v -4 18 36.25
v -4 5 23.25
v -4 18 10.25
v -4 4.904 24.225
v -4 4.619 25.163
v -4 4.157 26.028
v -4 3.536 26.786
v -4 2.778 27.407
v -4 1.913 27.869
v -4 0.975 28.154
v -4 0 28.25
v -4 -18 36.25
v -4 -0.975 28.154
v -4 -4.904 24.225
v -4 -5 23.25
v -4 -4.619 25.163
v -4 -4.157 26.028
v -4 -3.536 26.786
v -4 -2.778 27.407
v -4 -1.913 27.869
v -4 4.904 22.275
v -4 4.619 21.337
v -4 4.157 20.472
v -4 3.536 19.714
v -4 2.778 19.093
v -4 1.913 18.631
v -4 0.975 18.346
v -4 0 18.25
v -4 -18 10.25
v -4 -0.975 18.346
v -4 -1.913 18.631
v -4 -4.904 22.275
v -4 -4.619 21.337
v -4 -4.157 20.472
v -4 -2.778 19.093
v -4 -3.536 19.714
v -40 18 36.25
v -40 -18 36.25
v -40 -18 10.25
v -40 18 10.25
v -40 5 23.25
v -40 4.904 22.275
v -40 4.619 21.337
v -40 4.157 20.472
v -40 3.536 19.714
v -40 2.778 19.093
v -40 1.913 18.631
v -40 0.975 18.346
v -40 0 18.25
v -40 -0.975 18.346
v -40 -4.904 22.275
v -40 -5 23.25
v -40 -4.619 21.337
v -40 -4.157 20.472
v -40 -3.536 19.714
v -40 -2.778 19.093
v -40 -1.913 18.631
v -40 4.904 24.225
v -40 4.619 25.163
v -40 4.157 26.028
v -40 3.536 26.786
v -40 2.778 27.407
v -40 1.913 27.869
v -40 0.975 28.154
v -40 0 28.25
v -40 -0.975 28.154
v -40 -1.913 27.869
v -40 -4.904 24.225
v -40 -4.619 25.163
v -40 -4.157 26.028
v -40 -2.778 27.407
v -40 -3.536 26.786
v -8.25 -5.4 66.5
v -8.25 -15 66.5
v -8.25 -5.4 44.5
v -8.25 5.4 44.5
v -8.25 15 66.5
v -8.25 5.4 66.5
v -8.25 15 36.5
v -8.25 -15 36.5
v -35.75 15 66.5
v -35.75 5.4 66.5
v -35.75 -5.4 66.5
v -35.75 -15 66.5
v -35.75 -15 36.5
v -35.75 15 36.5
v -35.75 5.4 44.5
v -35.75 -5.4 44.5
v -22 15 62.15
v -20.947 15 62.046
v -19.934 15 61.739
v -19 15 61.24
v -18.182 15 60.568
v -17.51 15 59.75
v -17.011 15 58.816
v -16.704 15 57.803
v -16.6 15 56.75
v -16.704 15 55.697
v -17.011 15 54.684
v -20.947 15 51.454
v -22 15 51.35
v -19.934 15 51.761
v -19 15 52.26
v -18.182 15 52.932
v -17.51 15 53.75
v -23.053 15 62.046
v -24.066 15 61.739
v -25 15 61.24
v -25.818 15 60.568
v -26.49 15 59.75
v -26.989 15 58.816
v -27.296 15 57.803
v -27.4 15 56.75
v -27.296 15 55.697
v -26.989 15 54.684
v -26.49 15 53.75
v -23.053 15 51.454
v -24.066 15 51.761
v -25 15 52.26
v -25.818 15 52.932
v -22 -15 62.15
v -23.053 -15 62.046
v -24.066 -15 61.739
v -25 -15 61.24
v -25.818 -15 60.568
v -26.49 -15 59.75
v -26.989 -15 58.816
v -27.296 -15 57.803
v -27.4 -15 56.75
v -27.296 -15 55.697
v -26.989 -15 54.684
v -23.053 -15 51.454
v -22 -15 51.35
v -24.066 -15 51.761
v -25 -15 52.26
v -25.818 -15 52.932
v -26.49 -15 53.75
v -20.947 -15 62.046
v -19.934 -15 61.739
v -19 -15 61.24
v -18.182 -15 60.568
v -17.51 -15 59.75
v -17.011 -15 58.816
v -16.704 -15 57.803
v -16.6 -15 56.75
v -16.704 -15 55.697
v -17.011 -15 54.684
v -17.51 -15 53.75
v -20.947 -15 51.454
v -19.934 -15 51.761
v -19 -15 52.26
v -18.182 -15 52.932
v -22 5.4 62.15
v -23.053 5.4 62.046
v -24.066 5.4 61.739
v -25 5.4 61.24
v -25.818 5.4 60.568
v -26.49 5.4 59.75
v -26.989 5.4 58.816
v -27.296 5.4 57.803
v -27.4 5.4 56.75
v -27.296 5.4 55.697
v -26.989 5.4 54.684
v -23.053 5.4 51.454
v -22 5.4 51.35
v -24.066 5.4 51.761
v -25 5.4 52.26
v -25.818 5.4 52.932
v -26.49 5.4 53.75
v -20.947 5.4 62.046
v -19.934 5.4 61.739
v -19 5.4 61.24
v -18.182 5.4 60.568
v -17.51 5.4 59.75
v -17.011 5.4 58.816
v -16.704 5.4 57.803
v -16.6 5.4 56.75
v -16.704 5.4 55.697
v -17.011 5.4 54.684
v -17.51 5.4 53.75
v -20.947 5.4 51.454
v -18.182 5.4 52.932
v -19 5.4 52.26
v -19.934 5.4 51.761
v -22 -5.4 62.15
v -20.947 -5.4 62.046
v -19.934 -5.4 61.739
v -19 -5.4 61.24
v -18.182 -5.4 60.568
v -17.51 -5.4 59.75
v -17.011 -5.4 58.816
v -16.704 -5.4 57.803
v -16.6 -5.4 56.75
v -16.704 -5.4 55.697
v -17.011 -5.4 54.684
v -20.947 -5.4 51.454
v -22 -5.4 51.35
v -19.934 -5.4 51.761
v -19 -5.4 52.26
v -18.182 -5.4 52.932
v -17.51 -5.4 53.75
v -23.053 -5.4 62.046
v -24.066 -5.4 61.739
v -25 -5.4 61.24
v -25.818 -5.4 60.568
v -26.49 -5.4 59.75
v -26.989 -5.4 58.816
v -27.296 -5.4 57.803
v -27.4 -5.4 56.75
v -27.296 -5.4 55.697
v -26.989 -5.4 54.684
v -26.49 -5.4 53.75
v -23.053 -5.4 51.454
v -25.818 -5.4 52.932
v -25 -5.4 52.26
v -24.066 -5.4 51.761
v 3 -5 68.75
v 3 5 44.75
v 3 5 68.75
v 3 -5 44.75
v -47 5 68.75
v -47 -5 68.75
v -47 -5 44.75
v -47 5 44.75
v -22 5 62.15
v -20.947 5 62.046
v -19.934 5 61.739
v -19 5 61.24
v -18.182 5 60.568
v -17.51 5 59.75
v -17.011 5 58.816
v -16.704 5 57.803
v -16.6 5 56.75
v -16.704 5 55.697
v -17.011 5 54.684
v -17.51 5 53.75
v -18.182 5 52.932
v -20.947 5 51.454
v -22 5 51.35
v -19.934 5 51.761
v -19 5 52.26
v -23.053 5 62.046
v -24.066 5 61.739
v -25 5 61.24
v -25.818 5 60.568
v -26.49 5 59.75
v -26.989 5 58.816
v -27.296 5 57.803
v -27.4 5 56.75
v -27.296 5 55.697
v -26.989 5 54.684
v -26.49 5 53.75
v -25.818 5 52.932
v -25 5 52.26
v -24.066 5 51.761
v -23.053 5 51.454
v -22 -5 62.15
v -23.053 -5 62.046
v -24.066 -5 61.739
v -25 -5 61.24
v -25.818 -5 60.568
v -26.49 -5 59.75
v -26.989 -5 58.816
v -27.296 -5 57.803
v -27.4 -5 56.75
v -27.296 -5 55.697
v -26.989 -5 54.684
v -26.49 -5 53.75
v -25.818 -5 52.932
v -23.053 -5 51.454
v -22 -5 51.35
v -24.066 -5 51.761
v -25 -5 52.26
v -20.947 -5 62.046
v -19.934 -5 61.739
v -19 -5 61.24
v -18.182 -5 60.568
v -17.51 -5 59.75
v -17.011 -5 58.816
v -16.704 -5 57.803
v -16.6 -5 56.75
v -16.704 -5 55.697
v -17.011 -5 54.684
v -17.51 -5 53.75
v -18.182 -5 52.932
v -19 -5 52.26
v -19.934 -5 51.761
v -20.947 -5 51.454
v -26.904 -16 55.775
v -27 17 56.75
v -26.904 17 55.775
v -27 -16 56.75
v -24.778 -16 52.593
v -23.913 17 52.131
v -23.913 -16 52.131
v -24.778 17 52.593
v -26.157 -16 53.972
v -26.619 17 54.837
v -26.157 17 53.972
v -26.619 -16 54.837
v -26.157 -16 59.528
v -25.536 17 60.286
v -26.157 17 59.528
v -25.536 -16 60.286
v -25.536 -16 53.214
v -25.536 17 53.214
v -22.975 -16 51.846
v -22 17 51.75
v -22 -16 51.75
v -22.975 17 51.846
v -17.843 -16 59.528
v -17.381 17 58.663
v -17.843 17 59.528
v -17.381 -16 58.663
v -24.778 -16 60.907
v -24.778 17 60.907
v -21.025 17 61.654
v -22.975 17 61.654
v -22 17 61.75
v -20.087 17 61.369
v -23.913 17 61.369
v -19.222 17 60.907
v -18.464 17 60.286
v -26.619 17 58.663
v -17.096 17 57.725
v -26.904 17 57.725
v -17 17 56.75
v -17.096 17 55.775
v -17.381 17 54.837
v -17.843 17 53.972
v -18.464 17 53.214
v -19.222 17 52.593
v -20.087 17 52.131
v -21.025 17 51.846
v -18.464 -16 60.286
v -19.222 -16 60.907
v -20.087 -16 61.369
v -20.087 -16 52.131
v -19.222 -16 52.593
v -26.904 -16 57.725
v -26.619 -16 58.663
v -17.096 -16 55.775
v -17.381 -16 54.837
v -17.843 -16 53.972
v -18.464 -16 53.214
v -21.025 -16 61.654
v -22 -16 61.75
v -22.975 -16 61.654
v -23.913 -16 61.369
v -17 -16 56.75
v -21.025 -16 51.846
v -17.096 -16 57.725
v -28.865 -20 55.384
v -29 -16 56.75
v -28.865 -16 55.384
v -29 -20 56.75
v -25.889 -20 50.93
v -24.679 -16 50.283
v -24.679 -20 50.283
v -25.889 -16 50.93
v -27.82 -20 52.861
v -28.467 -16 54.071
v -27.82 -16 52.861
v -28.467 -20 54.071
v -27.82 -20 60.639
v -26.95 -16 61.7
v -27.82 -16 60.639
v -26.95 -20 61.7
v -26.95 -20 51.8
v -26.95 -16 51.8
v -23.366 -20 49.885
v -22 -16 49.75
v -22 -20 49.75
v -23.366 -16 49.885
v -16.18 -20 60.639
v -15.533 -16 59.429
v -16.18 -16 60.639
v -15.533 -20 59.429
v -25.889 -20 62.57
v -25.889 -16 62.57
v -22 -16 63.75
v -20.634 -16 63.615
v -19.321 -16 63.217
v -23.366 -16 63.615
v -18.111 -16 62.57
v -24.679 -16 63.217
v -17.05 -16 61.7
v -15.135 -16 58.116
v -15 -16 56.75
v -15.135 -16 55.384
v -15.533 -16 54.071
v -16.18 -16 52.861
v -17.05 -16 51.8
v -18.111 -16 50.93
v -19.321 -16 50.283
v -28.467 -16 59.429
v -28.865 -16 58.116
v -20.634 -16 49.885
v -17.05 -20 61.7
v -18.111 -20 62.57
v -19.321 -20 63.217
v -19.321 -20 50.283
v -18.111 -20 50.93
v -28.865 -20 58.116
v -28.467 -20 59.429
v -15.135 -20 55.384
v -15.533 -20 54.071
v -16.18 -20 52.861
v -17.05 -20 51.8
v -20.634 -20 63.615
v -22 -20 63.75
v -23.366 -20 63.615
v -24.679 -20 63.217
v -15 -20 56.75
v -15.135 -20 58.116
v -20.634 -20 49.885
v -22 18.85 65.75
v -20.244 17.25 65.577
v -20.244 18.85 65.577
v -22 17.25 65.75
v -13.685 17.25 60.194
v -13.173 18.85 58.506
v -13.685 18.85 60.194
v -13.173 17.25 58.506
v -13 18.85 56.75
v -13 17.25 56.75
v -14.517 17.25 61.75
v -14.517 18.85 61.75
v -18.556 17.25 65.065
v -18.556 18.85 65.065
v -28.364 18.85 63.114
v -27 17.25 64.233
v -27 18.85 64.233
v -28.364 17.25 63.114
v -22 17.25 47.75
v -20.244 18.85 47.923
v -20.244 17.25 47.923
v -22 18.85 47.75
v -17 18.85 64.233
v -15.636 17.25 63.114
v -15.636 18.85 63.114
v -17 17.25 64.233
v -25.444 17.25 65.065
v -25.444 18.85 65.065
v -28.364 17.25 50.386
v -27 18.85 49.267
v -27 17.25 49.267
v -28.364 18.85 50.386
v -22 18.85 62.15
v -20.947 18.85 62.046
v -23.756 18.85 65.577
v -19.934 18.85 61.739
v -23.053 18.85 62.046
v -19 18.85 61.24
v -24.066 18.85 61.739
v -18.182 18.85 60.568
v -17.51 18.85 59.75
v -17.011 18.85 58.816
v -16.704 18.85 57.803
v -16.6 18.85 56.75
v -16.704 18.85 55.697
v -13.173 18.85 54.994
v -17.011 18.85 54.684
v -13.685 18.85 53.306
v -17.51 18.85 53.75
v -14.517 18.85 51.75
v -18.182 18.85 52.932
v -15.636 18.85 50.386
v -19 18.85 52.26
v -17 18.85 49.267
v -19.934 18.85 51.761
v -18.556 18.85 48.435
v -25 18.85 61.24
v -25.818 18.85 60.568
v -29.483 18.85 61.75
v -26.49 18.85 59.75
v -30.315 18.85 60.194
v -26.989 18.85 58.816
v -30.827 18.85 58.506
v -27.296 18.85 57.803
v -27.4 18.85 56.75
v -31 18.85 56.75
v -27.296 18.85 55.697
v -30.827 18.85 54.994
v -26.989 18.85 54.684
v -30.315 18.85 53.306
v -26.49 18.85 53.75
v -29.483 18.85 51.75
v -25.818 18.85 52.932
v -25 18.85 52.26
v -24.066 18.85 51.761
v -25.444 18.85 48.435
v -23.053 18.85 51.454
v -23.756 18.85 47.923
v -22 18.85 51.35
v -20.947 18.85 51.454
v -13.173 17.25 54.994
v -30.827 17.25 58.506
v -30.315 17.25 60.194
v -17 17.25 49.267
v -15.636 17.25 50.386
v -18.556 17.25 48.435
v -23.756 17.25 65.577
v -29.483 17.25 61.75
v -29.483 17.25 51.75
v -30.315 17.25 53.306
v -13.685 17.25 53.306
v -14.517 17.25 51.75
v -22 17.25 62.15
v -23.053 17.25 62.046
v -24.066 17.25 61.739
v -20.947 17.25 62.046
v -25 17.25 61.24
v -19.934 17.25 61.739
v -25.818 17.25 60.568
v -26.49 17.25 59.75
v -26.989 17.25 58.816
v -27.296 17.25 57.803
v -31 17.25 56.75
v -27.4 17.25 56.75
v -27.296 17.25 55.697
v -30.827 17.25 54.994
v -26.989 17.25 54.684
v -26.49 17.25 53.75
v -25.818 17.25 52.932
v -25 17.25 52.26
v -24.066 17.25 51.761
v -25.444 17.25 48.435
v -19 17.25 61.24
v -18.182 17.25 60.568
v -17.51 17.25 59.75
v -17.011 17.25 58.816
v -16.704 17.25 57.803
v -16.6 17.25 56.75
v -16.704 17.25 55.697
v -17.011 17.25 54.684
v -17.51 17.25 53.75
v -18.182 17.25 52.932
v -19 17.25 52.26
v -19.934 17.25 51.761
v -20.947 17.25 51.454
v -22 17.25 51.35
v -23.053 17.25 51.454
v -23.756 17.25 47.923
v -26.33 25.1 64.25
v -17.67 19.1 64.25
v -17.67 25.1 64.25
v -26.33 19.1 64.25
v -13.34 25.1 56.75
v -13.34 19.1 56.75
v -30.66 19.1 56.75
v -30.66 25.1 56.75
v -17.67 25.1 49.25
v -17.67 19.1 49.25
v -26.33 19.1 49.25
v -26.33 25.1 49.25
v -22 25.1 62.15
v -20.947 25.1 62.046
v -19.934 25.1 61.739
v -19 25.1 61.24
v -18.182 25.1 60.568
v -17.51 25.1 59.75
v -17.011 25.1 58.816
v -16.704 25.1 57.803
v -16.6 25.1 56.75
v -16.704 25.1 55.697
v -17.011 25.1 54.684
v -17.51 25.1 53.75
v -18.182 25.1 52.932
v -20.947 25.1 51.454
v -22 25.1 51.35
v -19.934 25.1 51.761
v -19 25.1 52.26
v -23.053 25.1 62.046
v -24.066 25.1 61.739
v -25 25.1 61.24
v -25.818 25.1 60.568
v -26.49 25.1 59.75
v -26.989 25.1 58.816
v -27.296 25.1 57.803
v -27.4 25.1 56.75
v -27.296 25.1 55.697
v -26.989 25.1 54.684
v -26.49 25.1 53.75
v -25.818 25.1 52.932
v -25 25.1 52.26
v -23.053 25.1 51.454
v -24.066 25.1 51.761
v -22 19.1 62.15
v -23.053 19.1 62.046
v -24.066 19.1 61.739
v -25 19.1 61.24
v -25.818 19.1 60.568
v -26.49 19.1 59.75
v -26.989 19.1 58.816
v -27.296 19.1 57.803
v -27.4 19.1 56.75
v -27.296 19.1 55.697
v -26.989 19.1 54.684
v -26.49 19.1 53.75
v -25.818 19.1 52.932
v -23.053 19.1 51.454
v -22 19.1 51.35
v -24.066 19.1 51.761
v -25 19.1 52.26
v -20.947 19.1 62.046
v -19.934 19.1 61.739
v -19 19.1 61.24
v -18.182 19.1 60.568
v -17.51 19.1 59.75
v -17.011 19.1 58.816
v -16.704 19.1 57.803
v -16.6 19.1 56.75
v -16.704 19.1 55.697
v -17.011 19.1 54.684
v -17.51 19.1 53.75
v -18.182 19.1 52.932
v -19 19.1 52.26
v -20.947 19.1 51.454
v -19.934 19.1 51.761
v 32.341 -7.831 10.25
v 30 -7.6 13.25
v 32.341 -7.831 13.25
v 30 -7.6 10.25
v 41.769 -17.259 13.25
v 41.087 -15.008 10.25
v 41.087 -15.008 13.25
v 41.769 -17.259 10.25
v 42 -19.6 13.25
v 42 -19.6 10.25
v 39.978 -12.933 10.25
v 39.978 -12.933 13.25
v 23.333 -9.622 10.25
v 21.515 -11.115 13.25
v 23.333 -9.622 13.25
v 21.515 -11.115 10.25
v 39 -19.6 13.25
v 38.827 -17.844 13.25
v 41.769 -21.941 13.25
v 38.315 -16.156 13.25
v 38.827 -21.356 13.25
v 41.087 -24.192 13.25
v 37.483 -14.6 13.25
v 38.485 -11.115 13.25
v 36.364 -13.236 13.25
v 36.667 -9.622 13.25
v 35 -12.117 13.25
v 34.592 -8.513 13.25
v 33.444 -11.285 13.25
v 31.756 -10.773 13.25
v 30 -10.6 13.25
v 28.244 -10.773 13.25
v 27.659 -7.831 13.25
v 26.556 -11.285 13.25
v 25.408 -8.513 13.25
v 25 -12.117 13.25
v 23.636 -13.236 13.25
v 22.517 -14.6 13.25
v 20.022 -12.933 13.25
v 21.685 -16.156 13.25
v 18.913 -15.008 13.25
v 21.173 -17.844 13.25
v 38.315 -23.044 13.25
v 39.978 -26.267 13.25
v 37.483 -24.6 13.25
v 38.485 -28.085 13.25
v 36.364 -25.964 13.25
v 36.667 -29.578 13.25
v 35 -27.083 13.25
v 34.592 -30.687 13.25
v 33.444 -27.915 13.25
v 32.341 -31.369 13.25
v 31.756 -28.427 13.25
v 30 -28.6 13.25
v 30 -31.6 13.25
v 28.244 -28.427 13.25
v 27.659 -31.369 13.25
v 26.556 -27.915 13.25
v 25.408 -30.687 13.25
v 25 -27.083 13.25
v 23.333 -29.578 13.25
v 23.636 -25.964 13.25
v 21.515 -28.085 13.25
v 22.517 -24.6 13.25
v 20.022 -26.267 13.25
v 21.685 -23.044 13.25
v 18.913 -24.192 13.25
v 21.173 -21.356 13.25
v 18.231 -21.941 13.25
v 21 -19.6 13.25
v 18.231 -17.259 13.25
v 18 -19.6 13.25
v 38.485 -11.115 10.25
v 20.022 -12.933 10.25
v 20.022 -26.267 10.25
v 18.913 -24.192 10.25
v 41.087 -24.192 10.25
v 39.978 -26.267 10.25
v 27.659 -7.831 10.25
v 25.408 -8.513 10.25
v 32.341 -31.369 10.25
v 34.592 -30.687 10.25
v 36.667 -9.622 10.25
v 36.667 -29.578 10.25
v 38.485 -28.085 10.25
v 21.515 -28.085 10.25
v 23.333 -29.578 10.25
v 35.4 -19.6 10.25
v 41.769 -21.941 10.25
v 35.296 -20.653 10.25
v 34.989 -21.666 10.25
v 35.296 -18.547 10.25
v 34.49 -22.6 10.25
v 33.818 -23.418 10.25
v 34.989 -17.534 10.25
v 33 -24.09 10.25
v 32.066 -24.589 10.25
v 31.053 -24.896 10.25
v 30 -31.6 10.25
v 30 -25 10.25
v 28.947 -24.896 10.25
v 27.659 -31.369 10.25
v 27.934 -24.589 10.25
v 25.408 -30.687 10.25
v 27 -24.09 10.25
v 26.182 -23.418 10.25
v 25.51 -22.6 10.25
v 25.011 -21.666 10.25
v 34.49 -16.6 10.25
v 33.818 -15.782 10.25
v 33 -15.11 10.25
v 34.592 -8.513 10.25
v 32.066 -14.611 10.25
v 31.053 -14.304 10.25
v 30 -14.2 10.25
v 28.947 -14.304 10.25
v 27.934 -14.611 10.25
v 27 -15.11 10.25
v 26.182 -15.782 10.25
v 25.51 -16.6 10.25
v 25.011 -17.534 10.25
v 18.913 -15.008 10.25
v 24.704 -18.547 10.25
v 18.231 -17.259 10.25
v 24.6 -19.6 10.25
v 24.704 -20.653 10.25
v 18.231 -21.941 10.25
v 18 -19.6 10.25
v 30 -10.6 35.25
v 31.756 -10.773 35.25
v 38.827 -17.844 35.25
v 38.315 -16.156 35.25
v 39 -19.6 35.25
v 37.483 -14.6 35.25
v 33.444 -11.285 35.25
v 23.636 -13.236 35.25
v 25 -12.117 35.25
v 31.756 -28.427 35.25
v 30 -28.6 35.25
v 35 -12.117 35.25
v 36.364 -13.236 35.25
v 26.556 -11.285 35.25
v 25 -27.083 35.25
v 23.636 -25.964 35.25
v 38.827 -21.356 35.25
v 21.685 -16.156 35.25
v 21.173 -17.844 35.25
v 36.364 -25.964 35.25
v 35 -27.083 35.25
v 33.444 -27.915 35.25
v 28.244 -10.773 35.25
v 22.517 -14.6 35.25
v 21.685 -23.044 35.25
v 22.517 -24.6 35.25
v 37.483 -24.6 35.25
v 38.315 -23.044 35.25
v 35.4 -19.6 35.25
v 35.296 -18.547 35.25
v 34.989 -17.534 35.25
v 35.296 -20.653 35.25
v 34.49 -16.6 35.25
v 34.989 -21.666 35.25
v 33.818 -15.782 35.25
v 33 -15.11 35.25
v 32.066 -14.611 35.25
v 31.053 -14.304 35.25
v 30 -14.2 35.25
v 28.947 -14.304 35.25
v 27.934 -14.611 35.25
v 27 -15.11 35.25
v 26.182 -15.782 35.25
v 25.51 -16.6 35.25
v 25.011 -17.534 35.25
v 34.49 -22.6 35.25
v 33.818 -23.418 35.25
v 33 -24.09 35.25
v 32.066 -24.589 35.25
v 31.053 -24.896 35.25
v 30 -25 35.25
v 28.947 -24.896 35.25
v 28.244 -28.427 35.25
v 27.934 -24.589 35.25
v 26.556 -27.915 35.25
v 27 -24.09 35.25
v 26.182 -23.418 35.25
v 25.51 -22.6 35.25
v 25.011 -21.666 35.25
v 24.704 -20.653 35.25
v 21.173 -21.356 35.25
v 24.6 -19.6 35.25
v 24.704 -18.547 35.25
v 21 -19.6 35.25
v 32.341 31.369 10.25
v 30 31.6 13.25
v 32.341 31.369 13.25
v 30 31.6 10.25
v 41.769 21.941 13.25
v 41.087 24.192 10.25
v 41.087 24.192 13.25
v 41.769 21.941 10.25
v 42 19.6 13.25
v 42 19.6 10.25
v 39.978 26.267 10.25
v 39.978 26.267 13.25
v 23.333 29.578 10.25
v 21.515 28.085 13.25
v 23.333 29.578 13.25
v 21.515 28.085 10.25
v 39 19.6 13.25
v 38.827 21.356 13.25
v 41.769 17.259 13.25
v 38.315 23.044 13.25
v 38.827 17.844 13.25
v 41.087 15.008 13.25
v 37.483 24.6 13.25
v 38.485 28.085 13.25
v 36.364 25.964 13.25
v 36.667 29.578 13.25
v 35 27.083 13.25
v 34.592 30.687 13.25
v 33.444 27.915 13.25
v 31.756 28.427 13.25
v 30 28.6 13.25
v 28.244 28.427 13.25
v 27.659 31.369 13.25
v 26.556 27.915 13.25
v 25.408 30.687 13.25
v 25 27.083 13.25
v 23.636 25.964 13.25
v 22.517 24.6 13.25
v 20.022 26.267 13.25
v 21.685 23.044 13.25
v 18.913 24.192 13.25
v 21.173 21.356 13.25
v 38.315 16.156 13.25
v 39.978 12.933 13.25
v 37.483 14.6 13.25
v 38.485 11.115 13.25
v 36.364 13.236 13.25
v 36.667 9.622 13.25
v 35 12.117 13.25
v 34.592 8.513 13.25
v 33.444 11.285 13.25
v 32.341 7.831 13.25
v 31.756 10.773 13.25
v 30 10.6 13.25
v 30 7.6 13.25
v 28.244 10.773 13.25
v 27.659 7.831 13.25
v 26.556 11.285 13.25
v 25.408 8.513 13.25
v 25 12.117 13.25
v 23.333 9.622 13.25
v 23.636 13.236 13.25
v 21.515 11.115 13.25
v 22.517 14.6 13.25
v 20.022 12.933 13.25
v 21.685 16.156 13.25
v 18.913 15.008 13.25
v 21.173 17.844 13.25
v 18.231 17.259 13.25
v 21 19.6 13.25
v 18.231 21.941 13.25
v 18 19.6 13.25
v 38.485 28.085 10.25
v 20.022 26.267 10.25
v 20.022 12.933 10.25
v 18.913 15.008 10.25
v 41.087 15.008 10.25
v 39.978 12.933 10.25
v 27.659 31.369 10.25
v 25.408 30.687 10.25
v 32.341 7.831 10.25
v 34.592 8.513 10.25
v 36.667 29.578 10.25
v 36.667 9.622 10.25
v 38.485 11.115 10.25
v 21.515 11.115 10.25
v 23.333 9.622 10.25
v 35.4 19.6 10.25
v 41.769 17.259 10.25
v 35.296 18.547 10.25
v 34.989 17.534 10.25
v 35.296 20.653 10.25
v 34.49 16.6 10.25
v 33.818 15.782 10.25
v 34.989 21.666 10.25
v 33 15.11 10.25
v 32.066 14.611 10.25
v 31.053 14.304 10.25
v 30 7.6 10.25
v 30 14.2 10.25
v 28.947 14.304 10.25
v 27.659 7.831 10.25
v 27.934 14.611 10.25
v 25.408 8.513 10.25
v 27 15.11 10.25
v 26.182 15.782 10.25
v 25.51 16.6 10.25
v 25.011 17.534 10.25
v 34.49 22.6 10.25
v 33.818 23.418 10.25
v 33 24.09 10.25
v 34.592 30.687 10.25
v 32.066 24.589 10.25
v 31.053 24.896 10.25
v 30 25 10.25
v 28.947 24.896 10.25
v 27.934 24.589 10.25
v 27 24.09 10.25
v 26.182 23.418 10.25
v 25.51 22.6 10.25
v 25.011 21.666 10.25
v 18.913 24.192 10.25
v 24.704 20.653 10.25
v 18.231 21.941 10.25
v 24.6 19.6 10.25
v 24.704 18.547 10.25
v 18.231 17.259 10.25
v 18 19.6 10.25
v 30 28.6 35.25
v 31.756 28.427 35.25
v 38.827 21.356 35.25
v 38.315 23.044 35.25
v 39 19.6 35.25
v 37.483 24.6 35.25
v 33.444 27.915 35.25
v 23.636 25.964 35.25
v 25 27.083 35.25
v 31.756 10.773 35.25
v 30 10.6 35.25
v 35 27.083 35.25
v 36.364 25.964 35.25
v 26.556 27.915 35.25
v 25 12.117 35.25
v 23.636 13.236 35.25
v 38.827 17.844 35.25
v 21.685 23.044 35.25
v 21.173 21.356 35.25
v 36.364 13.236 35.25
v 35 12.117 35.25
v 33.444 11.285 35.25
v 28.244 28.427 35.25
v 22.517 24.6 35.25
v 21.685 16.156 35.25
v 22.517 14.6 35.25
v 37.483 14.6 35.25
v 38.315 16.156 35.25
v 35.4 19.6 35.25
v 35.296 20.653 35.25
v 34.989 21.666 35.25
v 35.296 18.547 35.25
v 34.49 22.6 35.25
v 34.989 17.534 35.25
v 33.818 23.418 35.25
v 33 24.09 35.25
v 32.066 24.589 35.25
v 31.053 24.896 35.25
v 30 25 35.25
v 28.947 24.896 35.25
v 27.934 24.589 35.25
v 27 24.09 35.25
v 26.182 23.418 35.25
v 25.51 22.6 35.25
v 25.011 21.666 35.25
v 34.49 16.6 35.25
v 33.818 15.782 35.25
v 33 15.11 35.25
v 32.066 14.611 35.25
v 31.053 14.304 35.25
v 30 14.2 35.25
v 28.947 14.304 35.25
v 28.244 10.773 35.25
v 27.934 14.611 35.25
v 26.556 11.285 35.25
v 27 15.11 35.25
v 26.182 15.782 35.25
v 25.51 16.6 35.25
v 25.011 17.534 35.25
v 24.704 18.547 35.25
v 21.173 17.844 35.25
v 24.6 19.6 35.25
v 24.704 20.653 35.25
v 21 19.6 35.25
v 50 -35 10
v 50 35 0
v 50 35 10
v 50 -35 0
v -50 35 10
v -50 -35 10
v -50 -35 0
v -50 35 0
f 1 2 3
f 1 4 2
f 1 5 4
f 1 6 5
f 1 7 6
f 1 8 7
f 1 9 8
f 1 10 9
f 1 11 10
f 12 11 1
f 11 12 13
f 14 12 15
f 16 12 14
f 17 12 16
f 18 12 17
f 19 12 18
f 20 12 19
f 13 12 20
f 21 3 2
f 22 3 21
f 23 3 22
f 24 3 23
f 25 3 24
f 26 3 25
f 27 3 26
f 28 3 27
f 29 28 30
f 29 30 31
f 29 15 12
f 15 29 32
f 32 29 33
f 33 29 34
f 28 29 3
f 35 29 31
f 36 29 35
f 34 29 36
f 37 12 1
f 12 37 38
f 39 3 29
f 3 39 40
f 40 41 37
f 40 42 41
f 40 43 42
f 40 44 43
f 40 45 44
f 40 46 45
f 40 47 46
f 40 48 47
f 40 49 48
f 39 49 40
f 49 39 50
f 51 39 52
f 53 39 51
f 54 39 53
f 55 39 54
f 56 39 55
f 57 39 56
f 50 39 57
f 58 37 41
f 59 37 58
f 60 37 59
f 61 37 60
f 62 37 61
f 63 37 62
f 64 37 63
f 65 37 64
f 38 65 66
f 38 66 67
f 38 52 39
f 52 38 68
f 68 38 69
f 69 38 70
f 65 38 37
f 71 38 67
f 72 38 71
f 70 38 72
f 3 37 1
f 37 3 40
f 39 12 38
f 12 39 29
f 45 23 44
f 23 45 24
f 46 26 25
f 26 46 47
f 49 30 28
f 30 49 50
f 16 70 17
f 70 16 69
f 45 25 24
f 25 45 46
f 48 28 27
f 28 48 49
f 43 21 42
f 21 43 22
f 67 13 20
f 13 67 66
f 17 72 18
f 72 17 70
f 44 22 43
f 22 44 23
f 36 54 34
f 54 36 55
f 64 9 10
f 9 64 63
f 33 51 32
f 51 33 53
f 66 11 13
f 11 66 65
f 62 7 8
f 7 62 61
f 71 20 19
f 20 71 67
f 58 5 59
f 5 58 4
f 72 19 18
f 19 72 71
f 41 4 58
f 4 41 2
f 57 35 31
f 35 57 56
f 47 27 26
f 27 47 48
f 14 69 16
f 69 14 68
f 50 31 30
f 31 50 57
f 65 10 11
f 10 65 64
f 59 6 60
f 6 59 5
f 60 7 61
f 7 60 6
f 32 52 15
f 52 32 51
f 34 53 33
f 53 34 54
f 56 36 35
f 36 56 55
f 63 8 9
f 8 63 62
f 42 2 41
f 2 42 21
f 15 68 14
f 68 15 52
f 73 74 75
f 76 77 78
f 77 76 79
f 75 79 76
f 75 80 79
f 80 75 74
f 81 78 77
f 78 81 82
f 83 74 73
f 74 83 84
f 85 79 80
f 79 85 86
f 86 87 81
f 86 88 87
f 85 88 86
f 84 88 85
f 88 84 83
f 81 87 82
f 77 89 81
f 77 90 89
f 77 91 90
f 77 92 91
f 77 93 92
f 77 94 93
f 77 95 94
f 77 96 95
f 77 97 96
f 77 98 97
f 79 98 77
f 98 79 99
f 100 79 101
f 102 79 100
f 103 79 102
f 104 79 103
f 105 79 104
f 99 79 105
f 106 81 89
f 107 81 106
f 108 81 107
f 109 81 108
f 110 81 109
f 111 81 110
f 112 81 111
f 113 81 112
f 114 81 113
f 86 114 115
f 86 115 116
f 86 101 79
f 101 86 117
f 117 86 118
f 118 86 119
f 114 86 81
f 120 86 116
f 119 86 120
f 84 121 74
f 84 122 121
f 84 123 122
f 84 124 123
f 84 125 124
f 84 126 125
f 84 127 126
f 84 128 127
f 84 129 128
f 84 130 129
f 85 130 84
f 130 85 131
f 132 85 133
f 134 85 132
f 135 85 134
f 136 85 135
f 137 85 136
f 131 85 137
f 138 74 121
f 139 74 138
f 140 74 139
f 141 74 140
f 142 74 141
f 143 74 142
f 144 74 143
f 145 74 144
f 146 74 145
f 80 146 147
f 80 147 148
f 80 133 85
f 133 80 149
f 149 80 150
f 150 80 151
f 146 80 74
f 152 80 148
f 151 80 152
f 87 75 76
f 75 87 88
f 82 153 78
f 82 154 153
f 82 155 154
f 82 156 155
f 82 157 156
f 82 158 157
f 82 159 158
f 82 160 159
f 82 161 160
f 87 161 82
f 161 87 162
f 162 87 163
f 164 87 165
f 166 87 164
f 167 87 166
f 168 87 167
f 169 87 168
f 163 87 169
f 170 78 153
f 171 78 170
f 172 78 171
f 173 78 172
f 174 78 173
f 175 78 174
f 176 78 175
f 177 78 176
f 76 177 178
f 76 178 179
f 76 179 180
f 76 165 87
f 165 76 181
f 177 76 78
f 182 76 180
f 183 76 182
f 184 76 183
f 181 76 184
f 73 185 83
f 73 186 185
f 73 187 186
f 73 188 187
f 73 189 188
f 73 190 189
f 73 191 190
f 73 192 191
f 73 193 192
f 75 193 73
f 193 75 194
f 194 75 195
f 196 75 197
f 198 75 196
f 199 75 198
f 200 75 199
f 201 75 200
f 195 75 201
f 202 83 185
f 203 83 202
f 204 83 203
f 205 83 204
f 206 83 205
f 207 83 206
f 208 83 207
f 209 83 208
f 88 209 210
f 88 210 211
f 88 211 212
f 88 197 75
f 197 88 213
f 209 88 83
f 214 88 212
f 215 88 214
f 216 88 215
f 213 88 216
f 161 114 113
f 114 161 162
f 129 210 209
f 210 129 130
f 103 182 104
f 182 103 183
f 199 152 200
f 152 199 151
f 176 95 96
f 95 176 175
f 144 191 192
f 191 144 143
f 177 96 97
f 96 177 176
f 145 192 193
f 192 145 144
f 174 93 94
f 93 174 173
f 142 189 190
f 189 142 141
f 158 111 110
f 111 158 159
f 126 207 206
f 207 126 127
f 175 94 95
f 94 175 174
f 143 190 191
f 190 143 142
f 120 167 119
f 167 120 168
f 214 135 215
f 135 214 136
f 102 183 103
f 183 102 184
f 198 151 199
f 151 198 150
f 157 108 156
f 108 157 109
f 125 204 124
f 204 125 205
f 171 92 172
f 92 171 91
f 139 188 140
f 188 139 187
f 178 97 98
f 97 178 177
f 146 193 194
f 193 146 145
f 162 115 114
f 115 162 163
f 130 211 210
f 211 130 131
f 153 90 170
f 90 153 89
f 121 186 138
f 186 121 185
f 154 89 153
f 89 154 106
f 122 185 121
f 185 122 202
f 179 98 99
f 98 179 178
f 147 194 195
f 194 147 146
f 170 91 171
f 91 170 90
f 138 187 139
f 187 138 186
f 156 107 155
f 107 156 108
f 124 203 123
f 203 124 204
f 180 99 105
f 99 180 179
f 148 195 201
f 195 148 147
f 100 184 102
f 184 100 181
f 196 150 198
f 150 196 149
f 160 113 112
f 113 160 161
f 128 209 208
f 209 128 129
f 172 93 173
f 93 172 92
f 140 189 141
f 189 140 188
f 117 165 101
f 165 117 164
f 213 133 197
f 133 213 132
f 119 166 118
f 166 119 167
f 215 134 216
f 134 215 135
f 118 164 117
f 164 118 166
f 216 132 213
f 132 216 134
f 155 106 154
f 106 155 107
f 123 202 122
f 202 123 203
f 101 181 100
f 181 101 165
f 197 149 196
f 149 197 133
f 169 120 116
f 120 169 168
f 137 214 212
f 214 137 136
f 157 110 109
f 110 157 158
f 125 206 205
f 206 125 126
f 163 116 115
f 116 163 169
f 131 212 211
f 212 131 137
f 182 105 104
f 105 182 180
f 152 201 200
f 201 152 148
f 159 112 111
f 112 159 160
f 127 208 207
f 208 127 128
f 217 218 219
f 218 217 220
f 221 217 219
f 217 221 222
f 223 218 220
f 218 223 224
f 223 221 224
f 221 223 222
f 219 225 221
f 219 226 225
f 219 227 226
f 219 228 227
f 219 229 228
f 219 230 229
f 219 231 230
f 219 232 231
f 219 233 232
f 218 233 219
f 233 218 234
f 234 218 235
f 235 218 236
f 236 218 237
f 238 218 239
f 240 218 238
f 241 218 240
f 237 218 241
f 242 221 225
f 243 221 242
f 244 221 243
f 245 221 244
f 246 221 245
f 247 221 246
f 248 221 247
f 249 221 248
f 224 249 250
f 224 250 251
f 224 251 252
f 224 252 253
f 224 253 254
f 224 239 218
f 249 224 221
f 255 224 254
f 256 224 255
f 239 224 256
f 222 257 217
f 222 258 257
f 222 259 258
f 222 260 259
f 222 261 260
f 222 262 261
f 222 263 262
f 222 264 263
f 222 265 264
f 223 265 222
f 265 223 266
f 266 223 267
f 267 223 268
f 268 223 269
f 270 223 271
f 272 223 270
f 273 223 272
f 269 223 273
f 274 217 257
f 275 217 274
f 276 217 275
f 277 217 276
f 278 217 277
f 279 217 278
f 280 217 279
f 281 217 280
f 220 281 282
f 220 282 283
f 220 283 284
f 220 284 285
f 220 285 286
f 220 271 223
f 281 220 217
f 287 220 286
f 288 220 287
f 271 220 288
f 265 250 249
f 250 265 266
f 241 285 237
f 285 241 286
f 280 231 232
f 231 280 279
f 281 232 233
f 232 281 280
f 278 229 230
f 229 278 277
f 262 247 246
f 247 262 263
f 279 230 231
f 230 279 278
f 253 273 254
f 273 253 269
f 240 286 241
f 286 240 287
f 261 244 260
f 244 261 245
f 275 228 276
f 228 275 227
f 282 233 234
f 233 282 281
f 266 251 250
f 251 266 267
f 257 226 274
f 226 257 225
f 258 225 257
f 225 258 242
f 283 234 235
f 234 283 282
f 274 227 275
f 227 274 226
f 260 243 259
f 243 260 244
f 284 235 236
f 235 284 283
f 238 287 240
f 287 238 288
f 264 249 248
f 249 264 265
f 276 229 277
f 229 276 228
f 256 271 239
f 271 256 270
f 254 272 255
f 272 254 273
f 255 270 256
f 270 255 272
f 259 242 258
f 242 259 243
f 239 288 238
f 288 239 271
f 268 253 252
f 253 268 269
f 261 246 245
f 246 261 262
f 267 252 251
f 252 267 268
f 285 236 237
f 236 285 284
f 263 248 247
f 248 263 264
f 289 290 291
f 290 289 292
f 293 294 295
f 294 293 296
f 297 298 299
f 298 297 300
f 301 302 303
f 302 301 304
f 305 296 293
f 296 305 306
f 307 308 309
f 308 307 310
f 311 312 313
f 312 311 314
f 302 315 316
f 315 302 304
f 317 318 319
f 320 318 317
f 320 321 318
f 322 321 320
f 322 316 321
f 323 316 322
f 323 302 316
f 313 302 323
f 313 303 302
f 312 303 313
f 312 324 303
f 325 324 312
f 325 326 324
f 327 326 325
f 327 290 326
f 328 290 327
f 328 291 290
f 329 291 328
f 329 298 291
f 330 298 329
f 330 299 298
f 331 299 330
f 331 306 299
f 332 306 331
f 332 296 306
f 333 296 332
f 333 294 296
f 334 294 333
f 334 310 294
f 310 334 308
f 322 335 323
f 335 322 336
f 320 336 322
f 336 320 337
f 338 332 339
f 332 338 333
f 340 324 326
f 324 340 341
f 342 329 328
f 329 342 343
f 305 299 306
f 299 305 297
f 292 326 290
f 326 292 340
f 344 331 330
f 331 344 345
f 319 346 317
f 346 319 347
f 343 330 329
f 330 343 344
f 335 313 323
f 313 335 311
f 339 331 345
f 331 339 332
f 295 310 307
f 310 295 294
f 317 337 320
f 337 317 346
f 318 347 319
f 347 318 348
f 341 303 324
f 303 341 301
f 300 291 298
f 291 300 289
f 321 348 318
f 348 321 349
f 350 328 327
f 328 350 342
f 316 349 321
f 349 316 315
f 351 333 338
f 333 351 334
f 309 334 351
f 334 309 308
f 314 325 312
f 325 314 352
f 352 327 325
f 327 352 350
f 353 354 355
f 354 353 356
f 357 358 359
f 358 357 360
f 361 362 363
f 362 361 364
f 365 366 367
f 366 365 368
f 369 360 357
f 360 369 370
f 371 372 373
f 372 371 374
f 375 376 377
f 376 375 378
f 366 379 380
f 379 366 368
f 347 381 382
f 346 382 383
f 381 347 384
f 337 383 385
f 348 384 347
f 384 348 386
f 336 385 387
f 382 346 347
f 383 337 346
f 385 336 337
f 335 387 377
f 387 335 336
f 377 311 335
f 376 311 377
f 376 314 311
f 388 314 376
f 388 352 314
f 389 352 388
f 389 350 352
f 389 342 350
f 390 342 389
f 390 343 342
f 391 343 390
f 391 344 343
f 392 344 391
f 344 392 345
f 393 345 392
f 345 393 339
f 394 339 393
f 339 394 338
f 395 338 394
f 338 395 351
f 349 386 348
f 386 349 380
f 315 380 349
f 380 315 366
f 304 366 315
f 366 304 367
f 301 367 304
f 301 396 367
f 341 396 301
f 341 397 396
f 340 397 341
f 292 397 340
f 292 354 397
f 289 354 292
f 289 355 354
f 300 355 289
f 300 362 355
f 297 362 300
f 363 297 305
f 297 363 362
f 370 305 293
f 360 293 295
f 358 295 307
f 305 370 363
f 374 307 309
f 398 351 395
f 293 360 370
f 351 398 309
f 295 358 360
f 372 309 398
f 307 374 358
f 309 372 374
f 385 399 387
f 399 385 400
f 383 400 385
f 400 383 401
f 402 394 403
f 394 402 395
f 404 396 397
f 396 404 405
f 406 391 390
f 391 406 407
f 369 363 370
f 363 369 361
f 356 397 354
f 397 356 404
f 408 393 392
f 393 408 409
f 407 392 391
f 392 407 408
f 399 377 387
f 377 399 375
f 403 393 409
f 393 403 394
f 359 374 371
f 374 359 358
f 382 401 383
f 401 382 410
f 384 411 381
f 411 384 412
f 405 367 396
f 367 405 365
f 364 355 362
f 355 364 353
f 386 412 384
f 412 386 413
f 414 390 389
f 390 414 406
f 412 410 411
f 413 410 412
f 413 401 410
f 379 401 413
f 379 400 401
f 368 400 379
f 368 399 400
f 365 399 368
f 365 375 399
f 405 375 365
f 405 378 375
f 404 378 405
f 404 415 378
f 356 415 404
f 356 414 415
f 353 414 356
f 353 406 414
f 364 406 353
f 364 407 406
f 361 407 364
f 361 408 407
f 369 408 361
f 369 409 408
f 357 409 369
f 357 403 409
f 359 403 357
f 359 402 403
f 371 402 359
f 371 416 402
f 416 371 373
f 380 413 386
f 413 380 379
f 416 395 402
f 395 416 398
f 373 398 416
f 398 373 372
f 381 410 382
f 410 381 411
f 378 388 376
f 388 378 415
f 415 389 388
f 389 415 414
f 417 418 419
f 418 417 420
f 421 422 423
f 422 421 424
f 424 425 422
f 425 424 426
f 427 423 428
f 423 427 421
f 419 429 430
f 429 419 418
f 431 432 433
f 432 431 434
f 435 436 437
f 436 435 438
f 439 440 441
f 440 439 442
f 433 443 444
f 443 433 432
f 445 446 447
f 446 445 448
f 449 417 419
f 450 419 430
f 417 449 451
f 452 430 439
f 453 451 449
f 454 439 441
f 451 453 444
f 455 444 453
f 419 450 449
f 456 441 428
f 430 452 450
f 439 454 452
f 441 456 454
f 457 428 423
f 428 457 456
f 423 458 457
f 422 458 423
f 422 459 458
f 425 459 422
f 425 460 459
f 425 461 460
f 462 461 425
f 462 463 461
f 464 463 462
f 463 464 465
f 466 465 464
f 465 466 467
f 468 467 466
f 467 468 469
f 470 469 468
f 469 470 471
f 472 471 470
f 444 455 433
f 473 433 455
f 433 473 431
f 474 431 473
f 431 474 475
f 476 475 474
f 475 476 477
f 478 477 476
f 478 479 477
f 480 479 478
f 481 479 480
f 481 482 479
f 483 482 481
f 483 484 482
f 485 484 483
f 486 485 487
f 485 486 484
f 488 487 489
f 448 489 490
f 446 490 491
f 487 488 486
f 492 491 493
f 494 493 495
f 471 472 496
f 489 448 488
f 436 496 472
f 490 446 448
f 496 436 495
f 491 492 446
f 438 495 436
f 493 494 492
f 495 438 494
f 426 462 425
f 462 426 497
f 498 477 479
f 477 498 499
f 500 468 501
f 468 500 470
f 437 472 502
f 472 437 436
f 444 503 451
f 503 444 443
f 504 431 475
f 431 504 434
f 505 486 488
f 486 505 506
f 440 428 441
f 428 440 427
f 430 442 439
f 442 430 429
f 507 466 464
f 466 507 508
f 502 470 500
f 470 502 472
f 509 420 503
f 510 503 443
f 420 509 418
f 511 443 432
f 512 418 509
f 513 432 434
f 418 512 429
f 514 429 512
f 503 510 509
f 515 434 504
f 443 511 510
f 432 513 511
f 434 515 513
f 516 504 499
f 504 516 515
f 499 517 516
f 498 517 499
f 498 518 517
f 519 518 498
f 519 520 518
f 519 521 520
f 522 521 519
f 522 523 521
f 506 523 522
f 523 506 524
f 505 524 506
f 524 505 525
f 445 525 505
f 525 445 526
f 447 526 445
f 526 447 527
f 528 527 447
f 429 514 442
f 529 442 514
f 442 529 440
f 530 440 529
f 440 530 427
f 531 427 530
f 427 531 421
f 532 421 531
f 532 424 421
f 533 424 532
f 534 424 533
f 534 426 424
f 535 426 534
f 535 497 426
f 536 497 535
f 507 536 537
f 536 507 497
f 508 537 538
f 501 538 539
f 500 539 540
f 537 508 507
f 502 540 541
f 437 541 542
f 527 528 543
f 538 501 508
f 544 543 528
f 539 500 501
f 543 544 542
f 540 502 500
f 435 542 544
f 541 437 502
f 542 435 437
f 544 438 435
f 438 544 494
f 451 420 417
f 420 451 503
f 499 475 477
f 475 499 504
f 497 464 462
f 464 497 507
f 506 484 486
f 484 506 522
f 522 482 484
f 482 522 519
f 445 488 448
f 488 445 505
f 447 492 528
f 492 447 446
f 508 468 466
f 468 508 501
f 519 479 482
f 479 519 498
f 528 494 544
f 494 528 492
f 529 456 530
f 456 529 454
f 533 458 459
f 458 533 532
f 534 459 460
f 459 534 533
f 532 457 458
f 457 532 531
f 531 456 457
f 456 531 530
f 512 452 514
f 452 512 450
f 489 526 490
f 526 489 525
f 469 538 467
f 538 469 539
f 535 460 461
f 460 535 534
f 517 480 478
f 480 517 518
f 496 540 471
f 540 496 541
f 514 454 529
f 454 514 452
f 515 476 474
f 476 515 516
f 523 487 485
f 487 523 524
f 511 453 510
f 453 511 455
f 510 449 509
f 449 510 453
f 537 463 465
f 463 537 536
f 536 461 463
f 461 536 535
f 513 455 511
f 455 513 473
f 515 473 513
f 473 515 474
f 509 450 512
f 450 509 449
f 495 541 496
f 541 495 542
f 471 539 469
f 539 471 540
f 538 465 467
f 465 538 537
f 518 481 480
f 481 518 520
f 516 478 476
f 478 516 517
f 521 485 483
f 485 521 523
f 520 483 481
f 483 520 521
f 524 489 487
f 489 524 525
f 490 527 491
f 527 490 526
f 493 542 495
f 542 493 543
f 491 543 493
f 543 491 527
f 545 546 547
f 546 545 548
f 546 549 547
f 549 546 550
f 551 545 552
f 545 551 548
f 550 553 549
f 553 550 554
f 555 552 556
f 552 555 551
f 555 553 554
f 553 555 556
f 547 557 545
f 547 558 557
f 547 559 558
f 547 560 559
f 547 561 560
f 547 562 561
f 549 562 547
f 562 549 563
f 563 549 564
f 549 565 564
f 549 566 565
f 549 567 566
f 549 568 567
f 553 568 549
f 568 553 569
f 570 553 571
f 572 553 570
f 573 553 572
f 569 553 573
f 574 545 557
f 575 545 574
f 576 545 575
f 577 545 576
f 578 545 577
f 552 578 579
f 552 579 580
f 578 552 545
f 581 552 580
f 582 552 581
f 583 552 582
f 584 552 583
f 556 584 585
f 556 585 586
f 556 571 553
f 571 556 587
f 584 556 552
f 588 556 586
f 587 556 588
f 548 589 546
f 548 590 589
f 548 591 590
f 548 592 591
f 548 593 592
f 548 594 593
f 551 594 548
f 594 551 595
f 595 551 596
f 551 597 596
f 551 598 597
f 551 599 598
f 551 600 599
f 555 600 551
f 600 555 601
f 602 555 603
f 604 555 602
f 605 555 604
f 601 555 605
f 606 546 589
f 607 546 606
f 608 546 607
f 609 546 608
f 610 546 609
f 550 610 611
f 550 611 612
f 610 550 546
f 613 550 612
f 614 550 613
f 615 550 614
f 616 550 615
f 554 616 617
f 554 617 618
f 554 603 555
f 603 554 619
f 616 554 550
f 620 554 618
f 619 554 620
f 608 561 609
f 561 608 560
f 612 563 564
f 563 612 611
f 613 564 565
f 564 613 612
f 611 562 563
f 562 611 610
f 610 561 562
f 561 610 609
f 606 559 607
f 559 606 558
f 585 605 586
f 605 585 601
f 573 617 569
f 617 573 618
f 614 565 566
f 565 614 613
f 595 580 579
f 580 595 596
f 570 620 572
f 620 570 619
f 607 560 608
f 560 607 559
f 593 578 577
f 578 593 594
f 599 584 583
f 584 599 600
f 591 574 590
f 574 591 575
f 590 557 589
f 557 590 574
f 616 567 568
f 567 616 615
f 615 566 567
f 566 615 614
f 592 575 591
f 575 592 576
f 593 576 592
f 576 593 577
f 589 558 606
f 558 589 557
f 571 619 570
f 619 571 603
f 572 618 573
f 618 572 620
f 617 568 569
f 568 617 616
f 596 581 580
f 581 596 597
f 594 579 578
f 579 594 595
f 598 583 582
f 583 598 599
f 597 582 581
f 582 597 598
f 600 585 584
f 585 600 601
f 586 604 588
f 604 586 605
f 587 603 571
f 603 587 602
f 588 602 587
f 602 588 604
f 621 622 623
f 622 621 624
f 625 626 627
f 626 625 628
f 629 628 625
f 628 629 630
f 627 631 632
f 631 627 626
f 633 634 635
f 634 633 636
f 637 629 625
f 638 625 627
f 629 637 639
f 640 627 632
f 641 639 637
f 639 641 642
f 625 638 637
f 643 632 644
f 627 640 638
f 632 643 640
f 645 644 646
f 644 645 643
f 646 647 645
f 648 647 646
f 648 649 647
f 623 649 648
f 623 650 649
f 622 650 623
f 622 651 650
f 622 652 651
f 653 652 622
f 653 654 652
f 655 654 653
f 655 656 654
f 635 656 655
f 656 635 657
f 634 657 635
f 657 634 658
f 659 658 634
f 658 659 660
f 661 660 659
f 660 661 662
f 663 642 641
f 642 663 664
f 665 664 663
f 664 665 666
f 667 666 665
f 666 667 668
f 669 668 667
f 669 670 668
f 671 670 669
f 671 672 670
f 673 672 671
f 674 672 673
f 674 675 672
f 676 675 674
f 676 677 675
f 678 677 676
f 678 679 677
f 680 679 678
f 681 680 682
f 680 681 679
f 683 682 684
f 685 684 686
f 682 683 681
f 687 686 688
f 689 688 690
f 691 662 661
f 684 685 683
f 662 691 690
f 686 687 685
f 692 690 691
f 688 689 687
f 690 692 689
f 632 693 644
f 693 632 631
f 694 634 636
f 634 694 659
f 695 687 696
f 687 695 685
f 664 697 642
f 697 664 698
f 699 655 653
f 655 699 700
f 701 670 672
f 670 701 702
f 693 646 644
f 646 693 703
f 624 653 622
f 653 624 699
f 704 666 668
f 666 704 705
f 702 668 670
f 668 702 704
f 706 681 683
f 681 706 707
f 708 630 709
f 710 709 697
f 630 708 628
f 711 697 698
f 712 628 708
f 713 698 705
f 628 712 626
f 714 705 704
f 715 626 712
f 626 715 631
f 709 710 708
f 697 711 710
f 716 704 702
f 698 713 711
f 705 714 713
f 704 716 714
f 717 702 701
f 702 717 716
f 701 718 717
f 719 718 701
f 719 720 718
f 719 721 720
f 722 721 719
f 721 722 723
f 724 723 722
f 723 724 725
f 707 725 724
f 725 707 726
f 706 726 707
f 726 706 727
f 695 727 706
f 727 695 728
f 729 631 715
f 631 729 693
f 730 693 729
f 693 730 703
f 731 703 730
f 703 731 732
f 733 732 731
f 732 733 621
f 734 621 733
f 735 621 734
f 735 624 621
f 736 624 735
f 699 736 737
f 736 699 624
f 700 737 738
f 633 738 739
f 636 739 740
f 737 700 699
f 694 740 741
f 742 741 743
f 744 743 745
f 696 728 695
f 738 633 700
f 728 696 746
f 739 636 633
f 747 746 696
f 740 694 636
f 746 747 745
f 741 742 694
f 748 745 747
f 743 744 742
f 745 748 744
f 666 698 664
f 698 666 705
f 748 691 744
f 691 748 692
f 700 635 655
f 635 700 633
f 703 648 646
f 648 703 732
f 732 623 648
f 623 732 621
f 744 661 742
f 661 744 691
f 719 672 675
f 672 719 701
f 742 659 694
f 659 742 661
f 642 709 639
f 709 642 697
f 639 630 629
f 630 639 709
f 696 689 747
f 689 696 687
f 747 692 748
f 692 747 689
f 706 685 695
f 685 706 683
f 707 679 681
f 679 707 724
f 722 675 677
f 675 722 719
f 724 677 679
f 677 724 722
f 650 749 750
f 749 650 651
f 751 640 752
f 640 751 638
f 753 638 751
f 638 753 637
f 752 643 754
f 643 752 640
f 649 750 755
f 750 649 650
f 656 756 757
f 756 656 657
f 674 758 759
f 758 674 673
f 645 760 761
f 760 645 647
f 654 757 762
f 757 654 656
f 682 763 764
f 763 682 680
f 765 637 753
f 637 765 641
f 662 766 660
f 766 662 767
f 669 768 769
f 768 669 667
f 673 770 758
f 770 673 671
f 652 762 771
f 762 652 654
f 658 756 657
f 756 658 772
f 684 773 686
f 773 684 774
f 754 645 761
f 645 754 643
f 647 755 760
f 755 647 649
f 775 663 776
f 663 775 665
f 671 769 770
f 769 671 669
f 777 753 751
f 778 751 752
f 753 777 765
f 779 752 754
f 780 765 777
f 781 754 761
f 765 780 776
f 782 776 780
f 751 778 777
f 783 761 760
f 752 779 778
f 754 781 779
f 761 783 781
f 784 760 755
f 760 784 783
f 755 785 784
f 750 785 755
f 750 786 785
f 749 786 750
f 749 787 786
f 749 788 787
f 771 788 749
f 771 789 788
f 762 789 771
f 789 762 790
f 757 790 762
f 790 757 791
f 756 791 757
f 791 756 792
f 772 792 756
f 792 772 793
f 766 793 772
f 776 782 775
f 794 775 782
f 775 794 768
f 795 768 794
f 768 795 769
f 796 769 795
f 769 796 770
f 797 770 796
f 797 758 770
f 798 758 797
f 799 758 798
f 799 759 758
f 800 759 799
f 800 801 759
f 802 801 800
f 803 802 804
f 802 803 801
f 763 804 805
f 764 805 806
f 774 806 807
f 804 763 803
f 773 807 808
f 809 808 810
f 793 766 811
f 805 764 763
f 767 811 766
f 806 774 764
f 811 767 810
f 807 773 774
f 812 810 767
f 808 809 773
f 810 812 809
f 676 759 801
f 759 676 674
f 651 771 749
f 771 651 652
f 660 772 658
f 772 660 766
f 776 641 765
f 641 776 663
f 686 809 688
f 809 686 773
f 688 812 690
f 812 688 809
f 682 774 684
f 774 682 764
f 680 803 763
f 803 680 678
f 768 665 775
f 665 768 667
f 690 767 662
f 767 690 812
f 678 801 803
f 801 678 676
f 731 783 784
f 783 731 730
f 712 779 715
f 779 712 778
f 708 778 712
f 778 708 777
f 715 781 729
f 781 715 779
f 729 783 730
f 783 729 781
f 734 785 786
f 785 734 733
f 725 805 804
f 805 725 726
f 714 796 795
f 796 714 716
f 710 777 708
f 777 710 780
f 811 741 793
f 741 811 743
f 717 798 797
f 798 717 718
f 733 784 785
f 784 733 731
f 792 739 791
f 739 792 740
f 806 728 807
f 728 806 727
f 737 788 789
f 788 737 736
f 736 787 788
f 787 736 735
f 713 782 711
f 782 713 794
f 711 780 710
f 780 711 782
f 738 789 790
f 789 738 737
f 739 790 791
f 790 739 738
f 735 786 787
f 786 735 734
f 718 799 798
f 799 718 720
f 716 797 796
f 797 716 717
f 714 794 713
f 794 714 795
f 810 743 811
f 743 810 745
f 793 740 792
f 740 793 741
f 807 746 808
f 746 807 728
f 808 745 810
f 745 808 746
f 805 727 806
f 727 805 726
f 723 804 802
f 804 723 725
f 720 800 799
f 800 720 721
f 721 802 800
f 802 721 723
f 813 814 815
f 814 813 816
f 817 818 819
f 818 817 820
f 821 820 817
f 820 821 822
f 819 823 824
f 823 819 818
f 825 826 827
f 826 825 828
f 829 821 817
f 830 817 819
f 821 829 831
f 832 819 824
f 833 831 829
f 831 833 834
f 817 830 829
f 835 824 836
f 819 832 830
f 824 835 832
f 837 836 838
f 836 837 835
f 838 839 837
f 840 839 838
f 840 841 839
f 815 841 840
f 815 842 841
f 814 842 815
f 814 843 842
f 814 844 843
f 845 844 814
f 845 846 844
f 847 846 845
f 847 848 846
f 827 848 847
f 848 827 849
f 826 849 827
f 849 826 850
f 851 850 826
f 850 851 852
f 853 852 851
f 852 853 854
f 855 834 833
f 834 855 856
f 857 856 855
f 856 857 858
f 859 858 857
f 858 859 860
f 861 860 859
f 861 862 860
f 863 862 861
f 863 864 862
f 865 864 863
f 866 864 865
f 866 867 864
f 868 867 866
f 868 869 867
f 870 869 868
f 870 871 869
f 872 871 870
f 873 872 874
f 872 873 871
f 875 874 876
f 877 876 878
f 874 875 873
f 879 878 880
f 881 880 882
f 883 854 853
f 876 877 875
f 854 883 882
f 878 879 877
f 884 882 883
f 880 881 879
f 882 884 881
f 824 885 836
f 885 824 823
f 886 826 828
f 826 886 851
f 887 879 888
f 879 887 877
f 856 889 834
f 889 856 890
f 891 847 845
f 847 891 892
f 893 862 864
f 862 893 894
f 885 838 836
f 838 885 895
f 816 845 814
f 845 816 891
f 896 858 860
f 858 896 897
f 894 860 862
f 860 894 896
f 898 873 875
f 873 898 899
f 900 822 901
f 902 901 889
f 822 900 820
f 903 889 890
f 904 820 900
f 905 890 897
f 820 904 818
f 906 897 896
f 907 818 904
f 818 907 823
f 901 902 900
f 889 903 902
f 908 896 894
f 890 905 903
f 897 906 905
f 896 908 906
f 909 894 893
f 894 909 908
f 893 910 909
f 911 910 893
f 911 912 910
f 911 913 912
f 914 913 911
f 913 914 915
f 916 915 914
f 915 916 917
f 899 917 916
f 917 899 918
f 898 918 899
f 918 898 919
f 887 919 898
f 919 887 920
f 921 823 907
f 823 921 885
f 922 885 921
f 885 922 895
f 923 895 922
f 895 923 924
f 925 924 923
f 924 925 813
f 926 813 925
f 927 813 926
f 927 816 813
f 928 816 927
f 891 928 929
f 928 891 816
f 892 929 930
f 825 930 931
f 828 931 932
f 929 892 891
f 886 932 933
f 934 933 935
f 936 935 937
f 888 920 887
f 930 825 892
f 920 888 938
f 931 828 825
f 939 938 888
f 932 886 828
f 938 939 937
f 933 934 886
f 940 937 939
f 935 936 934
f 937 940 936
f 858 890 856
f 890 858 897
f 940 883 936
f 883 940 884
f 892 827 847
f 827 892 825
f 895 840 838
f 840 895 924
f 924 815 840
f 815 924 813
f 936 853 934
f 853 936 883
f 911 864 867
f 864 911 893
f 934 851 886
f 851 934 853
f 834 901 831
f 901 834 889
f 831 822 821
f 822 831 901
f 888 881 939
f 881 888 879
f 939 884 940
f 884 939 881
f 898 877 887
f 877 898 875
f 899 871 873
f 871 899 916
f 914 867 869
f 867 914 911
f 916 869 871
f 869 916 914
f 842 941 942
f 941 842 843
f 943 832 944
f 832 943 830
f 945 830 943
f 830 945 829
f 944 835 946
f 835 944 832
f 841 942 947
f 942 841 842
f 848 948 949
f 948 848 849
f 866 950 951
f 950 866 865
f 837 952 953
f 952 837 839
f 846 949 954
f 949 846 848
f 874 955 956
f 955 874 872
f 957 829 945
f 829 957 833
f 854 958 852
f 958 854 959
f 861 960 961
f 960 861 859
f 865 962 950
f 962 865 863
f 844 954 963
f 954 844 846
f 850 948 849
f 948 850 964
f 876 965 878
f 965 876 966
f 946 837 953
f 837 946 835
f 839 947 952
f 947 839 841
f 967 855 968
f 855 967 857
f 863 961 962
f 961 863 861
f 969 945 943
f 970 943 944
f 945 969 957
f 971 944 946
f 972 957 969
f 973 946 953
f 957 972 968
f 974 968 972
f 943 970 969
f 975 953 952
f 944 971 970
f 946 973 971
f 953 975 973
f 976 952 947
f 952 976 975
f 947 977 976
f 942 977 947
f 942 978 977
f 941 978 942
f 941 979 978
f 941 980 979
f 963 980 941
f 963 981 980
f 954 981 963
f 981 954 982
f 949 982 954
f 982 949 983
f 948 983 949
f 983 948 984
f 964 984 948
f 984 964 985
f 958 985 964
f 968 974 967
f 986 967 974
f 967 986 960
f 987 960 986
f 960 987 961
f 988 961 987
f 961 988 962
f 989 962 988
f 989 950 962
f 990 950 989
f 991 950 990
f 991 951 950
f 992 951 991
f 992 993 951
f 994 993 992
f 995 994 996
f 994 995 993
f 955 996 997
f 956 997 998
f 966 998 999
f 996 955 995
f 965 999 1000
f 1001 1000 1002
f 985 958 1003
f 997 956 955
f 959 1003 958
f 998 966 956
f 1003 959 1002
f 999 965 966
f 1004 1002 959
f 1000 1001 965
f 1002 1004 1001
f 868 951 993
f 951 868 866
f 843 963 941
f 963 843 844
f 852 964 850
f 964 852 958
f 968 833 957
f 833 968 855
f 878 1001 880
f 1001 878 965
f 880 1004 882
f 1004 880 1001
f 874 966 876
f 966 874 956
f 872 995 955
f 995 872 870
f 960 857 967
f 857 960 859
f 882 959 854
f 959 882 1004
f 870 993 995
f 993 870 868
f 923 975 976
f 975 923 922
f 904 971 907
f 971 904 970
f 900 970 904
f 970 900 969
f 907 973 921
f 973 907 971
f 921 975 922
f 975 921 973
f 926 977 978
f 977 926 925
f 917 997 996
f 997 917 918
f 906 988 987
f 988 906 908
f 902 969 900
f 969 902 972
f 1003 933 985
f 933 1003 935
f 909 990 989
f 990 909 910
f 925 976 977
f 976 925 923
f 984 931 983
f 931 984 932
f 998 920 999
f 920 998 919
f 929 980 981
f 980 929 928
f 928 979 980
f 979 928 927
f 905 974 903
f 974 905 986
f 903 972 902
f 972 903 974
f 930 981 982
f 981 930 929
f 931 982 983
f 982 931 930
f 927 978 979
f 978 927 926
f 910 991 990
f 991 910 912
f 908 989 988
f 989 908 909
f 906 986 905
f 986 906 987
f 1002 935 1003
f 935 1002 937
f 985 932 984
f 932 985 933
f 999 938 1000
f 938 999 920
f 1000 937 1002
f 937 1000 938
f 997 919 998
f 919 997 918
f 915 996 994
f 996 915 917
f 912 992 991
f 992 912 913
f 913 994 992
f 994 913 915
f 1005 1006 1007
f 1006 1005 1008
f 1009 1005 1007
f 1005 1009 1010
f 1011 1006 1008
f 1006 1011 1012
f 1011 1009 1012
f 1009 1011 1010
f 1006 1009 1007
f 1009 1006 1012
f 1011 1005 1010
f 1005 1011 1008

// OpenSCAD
$fn = 32;

// ------------------------------------------------------------------------
// Indexing jig: plate 100 x 70 mm, pin d10
// Every part is its own module, assembly() places every instance.
// ------------------------------------------------------------------------

// --- part 1 ---
module jig_plate() {
  difference() {
    translate([-50, -35, 0]) cube([100, 70, 10]);
  }
}

// --- part 2 ---
module locator_block() {
  difference() {
    translate([-18, -18, 0]) cube([36, 36, 26]);
    translate([0, 0, 13]) rotate([0, 90, 0]) cylinder(h = 38, d = 10, center = true);
  }
}

// --- part 3 ---
module index_fork() {
  difference() {
    translate([-13.75, -15, 0]) cube([27.5, 30, 30]);
    translate([-14.75, -5.4, 8]) cube([29.5, 10.8, 23]);
    translate([0, 0, 20.25]) rotate([90, 0, 0]) cylinder(h = 32, d = 10.8, center = true);
  }
}

// --- part 4 ---
module index_arm() {
  difference() {
    translate([-25, -5, 0]) cube([50, 10, 24]);
    translate([0, 0, 12]) rotate([90, 0, 0]) cylinder(h = 12, d = 10.8, center = true);
  }
}

// --- part 5 ---
module index_pin() {
  rotate([0, 90, 0]) cylinder(h = 34, d = 10, center = true);
  translate([-20, 0, 0]) rotate([0, 90, 0]) cylinder(h = 4, d = 14);
}

// --- part 6 ---
module pin_washer() {
  difference() {
      translate([0, 0, 0]) cylinder(h = 1.6, d = 18);
      translate([0, 0, -1]) cylinder(h = 3.6, d = 10.8);
    }
}

// --- part 7 ---
module lock_nut() {
  difference() {
    linear_extrude(height = 6) polygon(points = [[8.66, 0], [4.33, 7.5], [-4.33, 7.5], [-8.66, 0], [-4.33, -7.5], [4.33, -7.5]]);
    translate([0, 0, -1]) cylinder(h = 8, d = 10.8);
  }
}

// --- part 8 ---
module guide_bush_a() {
  difference() {
    union() {
      cylinder(h = 3, d = 24);
      translate([0, 0, 3]) cylinder(h = 22, d = 18);
    }
    translate([0, 0, -1]) cylinder(h = 27, d = 10.8);
  }
}

// --- part 9 ---
module guide_bush_b() {
  difference() {
    union() {
      cylinder(h = 3, d = 24);
      translate([0, 0, 3]) cylinder(h = 22, d = 18);
    }
    translate([0, 0, -1]) cylinder(h = 27, d = 10.8);
  }
}

// --- assembly ---
module assembly() {
  color([0.80, 0.24, 0.20]) translate([0, 0, 0]) rotate([0, 0, 0]) jig_plate();
  color([0.20, 0.45, 0.75]) translate([-22, 0, 10.25]) rotate([0, 0, 0]) locator_block();
  color([0.25, 0.62, 0.32]) translate([-22, 0, 36.5]) rotate([0, 0, 0]) index_fork();
  color([0.92, 0.70, 0.18]) translate([-22, 0, 44.75]) rotate([0, 0, 0]) index_arm();
  color([0.58, 0.35, 0.70]) translate([-22, 0, 56.75]) rotate([0, 0, 90]) index_pin();
  color([0.16, 0.66, 0.66]) translate([-22, 18.85, 56.75]) rotate([90, 0, 0]) pin_washer();
  color([0.85, 0.48, 0.18]) translate([-22, 25.1, 56.75]) rotate([90, 0, 0]) lock_nut();
  color([0.55, 0.60, 0.65]) translate([30, -19.6, 10.25]) rotate([0, 0, 0]) guide_bush_a();
  color([0.75, 0.30, 0.55]) translate([30, 19.6, 10.25]) rotate([0, 0, 0]) guide_bush_b();
}

assembly();
